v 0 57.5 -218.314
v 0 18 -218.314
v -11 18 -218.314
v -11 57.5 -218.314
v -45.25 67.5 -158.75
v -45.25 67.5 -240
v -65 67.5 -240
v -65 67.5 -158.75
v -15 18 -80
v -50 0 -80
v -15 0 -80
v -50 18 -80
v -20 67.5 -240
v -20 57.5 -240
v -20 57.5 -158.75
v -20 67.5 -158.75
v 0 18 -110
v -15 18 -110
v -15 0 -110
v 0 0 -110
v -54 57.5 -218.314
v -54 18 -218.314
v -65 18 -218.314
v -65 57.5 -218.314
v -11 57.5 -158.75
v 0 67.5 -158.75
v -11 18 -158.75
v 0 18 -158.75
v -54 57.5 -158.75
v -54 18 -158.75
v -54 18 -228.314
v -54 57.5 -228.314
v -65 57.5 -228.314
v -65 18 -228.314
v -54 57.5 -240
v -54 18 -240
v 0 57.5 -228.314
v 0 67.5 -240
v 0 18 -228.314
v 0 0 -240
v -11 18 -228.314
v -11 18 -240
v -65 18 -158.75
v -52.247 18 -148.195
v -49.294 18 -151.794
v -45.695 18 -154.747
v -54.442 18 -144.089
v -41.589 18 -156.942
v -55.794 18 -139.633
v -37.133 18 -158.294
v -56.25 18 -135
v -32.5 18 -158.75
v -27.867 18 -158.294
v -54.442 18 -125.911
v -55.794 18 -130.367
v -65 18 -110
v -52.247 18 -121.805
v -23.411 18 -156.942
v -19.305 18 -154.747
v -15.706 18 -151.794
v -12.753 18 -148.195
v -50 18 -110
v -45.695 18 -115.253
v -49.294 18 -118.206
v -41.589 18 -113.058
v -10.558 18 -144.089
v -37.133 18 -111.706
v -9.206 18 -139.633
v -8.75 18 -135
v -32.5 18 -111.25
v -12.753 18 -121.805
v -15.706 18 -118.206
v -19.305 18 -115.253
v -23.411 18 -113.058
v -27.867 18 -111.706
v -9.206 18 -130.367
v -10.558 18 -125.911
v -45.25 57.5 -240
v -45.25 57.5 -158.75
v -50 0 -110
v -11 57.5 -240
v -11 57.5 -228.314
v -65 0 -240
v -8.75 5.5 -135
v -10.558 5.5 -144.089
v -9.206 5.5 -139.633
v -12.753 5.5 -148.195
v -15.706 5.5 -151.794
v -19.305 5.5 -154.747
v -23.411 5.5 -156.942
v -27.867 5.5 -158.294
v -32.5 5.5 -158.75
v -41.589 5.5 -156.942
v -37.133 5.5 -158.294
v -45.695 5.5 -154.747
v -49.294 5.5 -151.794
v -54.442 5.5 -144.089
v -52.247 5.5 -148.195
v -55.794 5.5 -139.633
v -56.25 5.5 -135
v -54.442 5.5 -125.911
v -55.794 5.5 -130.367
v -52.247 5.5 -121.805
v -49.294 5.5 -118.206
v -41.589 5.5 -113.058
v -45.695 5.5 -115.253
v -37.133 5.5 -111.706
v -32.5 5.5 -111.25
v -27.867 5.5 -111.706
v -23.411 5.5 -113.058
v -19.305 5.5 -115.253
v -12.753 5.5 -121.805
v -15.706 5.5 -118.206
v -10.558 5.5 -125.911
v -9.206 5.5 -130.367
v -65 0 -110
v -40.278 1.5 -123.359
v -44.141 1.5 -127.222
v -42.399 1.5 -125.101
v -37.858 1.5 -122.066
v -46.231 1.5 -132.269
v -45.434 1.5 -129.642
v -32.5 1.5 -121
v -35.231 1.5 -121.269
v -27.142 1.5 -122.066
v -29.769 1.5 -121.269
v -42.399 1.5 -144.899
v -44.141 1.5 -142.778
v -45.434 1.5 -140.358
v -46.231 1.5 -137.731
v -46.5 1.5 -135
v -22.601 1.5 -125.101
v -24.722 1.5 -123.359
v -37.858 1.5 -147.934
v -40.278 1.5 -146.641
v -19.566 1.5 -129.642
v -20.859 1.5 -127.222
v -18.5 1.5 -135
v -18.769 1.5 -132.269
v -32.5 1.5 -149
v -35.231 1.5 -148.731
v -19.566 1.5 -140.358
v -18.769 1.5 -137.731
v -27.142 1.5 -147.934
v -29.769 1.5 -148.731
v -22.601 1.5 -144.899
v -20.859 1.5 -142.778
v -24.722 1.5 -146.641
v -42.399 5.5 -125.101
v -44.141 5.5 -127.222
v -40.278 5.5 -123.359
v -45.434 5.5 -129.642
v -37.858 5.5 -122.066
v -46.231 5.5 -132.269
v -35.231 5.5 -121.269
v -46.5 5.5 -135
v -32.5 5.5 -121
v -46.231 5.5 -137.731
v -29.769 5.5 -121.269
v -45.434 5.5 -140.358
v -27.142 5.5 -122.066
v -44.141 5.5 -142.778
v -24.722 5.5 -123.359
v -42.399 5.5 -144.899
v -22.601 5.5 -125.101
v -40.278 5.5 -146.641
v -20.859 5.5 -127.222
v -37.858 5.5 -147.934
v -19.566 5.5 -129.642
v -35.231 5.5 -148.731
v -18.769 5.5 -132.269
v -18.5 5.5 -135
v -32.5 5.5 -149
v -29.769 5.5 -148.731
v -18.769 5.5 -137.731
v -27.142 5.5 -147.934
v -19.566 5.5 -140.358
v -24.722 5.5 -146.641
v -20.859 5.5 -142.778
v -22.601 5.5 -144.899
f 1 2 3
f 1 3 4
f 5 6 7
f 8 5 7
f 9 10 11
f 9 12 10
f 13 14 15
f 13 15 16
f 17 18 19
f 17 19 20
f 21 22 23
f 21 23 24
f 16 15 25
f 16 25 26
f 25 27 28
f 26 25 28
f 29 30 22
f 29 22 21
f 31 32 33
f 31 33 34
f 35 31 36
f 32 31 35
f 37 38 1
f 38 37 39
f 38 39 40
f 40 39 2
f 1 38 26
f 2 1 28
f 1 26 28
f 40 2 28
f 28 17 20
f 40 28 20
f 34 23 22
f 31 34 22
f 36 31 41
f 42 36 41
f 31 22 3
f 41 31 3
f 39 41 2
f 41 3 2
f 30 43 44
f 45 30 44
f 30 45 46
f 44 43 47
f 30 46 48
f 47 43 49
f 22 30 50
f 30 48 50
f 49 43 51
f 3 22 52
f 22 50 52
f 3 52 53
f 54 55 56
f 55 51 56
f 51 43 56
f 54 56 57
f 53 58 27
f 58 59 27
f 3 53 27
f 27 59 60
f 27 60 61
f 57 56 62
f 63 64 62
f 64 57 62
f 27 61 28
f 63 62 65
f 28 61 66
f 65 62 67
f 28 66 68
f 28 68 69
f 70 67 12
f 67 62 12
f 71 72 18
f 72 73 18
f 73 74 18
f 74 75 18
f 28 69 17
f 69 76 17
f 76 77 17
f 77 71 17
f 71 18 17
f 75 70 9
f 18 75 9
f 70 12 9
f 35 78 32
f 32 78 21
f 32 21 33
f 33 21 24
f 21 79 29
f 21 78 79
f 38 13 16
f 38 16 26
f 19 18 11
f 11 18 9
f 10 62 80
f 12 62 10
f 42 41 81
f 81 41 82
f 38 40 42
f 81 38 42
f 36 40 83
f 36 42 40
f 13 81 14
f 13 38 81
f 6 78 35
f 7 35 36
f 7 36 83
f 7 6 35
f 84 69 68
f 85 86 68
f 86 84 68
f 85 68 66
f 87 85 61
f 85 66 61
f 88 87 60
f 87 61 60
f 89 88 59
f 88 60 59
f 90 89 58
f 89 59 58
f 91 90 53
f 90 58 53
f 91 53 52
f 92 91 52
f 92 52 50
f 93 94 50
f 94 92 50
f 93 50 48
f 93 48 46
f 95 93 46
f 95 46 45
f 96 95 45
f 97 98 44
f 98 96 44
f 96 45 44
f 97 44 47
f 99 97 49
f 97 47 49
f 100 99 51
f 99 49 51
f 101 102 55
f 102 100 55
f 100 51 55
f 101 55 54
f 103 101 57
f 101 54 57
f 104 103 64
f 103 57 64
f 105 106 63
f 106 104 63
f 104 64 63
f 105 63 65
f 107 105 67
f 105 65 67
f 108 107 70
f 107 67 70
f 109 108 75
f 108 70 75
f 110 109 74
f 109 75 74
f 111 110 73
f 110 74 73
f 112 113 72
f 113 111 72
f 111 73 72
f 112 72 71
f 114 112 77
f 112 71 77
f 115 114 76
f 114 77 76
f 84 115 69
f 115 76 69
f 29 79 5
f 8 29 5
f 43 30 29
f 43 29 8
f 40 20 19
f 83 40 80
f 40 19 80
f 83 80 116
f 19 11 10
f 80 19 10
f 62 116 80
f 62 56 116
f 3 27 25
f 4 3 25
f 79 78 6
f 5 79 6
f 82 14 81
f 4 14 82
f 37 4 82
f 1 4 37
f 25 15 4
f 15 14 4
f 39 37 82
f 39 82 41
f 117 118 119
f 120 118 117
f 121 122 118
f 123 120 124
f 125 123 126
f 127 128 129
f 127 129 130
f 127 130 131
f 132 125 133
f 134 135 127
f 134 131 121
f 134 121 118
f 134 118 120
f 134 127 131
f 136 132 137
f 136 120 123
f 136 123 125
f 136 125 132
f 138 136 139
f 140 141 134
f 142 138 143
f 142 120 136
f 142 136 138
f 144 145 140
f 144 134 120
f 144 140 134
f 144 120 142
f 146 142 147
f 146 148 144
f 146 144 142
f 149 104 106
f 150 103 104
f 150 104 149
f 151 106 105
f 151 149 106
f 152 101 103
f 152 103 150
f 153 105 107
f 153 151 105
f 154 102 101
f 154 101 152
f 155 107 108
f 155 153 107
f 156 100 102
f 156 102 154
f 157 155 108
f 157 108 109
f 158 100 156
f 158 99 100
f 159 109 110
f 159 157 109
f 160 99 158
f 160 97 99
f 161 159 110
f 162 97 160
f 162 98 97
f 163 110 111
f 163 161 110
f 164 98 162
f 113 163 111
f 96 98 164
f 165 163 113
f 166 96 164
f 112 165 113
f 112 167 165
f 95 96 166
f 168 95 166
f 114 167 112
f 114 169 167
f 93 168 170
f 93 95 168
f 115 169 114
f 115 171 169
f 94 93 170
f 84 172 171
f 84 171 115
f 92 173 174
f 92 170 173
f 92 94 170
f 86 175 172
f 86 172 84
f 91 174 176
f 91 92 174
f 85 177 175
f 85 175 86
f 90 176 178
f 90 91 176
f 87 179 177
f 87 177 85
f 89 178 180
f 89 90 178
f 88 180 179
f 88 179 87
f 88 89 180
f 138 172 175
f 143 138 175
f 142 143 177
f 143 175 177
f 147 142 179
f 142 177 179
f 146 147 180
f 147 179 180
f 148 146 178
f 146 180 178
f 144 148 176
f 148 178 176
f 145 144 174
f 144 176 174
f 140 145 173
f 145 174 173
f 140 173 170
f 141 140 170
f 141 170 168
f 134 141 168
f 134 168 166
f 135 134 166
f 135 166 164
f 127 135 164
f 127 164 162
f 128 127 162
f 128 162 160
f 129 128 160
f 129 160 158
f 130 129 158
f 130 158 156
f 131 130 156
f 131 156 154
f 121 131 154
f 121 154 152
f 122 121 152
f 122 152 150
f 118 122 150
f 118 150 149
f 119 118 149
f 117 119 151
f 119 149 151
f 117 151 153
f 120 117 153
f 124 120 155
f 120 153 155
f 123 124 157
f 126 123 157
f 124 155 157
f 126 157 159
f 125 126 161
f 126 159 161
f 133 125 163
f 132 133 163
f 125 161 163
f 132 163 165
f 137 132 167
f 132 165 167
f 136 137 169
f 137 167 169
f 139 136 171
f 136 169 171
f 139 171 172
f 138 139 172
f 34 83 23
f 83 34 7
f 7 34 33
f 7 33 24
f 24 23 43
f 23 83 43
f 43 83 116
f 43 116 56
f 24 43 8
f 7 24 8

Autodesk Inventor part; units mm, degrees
ref_plane "YZ Plane" through (0, 0, 0) normal (1, 0, 0) x (0, 1, 0)
ref_plane "XZ Plane" through (0, 0, 0) normal (0, 1, 0) x (-1, 0, 0)
ref_plane "XY Plane" through (0, 0, 0) normal (0, 0, 1) x (1, 0, 0)
sketch "Sketch1" plane through (0, 0, 0) normal (0, 1, 0) x (-1, 0, 0)
  line L0 (0, 0) -> (65, 0)
  line L1 (65, 0) -> (65, -200)
  line L2 (65, -200) -> (0, -200)
  line L3 (0, -200) -> (0, 0)
  dimension "d0" = 65
  dimension "d1" = 200
extrude "Extrusion1" add sketch "Sketch1" along normal blind 18
sketch "Sketch2" plane through (0, 18, 0) normal (0, 1, 0) x (1, 0, 0)
  line L0 (0, 0) -> (0, 200) projected
  line L1 (0, 0) -> (-32.5, 0)
  line L2 (-65, 0) -> (0, 0) projected
  line L3 (-32.5, 0) -> (-32.5, 8)
  line L4 (-32.5, 8) -> (-55.5, 8)
  line L5 (-55.5, 8) -> (-55.5, 18.5)
  line L6 (-55.5, 18.5) -> (-9.5, 18.5)
  line L7 (-9.5, 18.5) -> (-9.5, 8)
  line L8 (-9.5, 8) -> (-32.5, 8)
  dimension "d4" = 8
  dimension "d5" = 23
  dimension "d6" = 10.5
  dimension "d7" = 46
  dimension "d8" = 10.5
extrude "Extrusion2" cut sketch "Sketch2" against normal through all
sketch "Sketch3" plane through (0, 18, 0) normal (0, 1, 0) x (1, 0, 0)
  line L0 (-55.5, 18.5) -> (-9.5, 18.5) projected
  line L1 (-32.5, 18.5) -> (-32.5, 135)
  circle A0 centre (-32.5, 135) radius 23.75
  point P0 (0, 0)
  dimension "d11" = 116.5
  dimension "d12" = 47.5
extrude "Extrusion3" cut sketch "Sketch3" against normal blind 12.5
sketch "Sketch4" plane through (-32.5, 5.5, -135) normal (0, 1, 0) x (1, 0, 0)
  circle A0 centre (0, 0) radius 14
  point P0 (32.5, -135)
  dimension "d15" = 28
extrude "Extrusion4" cut sketch "Sketch4" against normal blind 4
sketch "Sketch7" plane through (0, 18, 0) normal (0, 1, 0) x (1, 0, 0)
  line L0 (0, 200) -> (-65, 200) projected
  line L1 (-65, 200) -> (0, 200)
  line L2 (-32.5, 200) -> (-32.5, 158.75)
  circle A0 centre (-32.5, 135) radius 23.75 projected
  line L3 (-32.5, 200) -> (-11, 200)
  line L4 (-11, 200) -> (-54, 200)
  line L5 (0, 0) -> (0, 200) projected
  line L6 (-11, 200) -> (-11, 158.75)
  line L7 (-54, 200) -> (-54, 158.75)
  line L8 (-54, 158.75) -> (-65, 158.75)
  line L9 (-65, 200) -> (-65, 0) projected
  line L10 (-65, 200) -> (-54, 200)
  line L11 (-11, 158.75) -> (0, 158.75)
  line L12 (0, 200) -> (0, 158.75)
  line L13 (0, 200) -> (-11, 200)
  dimension "d19" = 21.5
  dimension "d20" = 43
extrude "Extrusion5" add sketch "Sketch7" along normal blind 39.5 contours L5 L11 L6 L0 | L7 L8 L9 L0
sketch "Sketch8" plane through (0, 57.5, 0) normal (0, 1, 0) x (1, 0, 0)
  line L0 (0, 0) -> (0, 200) projected
  line L1 (-11, 200) -> (-54, 200) projected
  line L2 (0, 200) -> (-11, 200)
  line L3 (0, 200) -> (-65, 200) projected
  line L4 (-11, 200) -> (-20, 200)
  line L5 (-20, 200) -> (-20, 158.75)
  line L6 (-20, 158.75) -> (0, 158.75)
  line L7 (0, 200) -> (0, 158.75)
  line L8 (-65, 158.75) -> (-54.25, 158.75)
  line L9 (-54.25, 158.75) -> (-45.25, 158.75)
  line L10 (-45.25, 158.75) -> (-45.25, 200)
  line L11 (-54, 200) -> (-65, 200) projected
  line L12 (-65, 200) -> (-45.25, 200)
  line L13 (-65, 159.6209) -> (-65, 200)
  line L14 (-65, 200) -> (-65, 158.75) projected
  line L15 (-65, 200) -> (-65, 158.75)
  dimension "d23" = 9
  dimension "d24" = 9
extrude "Extrusion6" add sketch "Sketch8" along normal blind 10
sketch "Sketch10" plane through (0, 0, -200) normal (0, 0, -1) x (-1, 0, 0)
  line L0 (20, 57.5) -> (11, 57.5) projected
  line L1 (20, 57.5) -> (20, 67.5) projected
  line L2 (20, 57.5) -> (20, 67.5)
  line L3 (20, 67.5) -> (0, 67.5) projected
  line L4 (20, 67.5) -> (0, 67.5)
  line L5 (0, 67.5) -> (0, 0)
  line L6 (0, 0) -> (65, 0) projected
  line L7 (0, 0) -> (65, 0)
  line L8 (65, 0) -> (65, 67.5) projected
  line L9 (65, 0) -> (65, 67.5)
  line L10 (45.25, 67.5) -> (65, 67.5) projected
  line L11 (65, 67.5) -> (45.25, 67.5)
  line L12 (45.25, 57.5) -> (45.25, 67.5) projected
  line L13 (45.25, 67.5) -> (45.25, 57.5)
  line L14 (45.25, 57.5) -> (54, 57.5) projected
  line L15 (45.25, 57.5) -> (54, 57.5)
  line L16 (54, 18) -> (54, 57.5) projected
  line L17 (54, 57.5) -> (54, 18)
  line L18 (11, 18) -> (11, 57.5) projected
  line L19 (54, 18) -> (11, 18)
  line L20 (11, 18) -> (11, 57.5)
  line L21 (11, 57.5) -> (20, 57.5)
extrude "Extrusion7" add sketch "Sketch10" along normal blind 40
sketch "Sketch14" plane through (0, 0, 0) normal (1, 0, 0) x (0, 0, -1)
  line L0 (240, 67.5) -> (240, 57.5) projected
  line L1 (240, 67.5) -> (228.3141, 67.5)
  line L2 (158.75, 67.5) -> (240, 67.5) projected
  line L3 (228.3141, 67.5) -> (228.3141, 18)
  line L4 (240, 18) -> (158.75, 18) projected
  line L5 (228.3141, 18) -> (218.3141, 18)
  line L6 (218.3141, 18) -> (218.3141, 67.5)
  line L7 (218.3141, 67.5) -> (228.3141, 67.5)
  line L8 (218.3141, 67.5) -> (218.3141, 57.5)
  line L9 (218.3141, 57.5) -> (228.3141, 57.5)
  line L10 (158.75, 57.5) -> (240, 57.5) projected
  point P0 (0, 0)
  dimension "d29" = 10
extrude "Extrusion8" cut sketch "Sketch14" against normal through all contours L3 L4 L6 L9
sketch "Sketch17" plane through (0, 18, 0) normal (0, 1, 0) x (1, 0, 0)
  line L0 (0, 158.75) -> (0, 240) projected
  line L1 (0, 240) -> (0, 110)
  line L2 (0, 0) -> (0, 240) projected
  line L3 (0, 110) -> (0, 90)
  line L4 (0, 90) -> (-15, 90)
  line L5 (-65, 0) -> (-65, 240) projected
  line L6 (-15, 90) -> (-15, 110)
  line L7 (-15, 110) -> (0, 110)
  line L8 (-15, 90) -> (-15, 80)
  line L9 (-65, 80) -> (-65, 110)
  line L10 (-65, 110) -> (-50, 110)
  line L11 (-50, 110) -> (-50, 80)
  line L12 (-50, 80) -> (-15, 80)
  line L13 (-65, 80) -> (-65, 0)
  line L14 (-65, 0) -> (0, 0) projected
  line L15 (0, 0) -> (0, 110)
  dimension "d33" = 130
  dimension "d34" = 20
  dimension "d35" = 15
  dimension "d36" = 10
  dimension "d37" = 15
  dimension "d38" = 30
extrude "Extrusion9" cut sketch "Sketch17" against normal through all
sketch "Sketch18" plane through (-50, 18, -80) normal (0, 0, 1) x (1, 0, 0)
  point P0 (50, -18)
sketch "Sketch19" plane through (0, 18, 0) normal (0, 1, 0) x (1, 0, 0)
  point P0 (0, 0)
sketch "Sketch20" plane through (-50, 18, -110) normal (-1, 0, 0) x (0, 0, 1)
  point P0 (110, -18)
sketch "Sketch21" plane through (0, 18, 0) normal (0, 1, 0) x (1, 0, 0)
  point P0 (0, 0)
ref_plane "Work Plane1" through (-32.5, 18, -158.75) normal (-1, 0, 0) x (0, 0, 1)
ref_plane "Work Plane2" through (-32.5, 18, -158.75) normal (1, 0, 0) x (0, 0, -1)
equation "\"BendRadius\" = Thickness"
equation "\"BendReliefWidth\" = Thickness"
equation "\"BendReliefDepth\" = 0.5 * Thickness"
equation "\"CornerReliefSize\" = 4 * Thickness"
equation "\"MinimumRemnant\" = 2 * Thickness"
equation "\"TransitionRadius\" = BendRadius"
equation "\"JacobiRadiusSize\" = BendRadius"
equation "\"GapSize\" = Thickness"
equation "\"Thickness\" = 0.5"
properties part number "techo"
